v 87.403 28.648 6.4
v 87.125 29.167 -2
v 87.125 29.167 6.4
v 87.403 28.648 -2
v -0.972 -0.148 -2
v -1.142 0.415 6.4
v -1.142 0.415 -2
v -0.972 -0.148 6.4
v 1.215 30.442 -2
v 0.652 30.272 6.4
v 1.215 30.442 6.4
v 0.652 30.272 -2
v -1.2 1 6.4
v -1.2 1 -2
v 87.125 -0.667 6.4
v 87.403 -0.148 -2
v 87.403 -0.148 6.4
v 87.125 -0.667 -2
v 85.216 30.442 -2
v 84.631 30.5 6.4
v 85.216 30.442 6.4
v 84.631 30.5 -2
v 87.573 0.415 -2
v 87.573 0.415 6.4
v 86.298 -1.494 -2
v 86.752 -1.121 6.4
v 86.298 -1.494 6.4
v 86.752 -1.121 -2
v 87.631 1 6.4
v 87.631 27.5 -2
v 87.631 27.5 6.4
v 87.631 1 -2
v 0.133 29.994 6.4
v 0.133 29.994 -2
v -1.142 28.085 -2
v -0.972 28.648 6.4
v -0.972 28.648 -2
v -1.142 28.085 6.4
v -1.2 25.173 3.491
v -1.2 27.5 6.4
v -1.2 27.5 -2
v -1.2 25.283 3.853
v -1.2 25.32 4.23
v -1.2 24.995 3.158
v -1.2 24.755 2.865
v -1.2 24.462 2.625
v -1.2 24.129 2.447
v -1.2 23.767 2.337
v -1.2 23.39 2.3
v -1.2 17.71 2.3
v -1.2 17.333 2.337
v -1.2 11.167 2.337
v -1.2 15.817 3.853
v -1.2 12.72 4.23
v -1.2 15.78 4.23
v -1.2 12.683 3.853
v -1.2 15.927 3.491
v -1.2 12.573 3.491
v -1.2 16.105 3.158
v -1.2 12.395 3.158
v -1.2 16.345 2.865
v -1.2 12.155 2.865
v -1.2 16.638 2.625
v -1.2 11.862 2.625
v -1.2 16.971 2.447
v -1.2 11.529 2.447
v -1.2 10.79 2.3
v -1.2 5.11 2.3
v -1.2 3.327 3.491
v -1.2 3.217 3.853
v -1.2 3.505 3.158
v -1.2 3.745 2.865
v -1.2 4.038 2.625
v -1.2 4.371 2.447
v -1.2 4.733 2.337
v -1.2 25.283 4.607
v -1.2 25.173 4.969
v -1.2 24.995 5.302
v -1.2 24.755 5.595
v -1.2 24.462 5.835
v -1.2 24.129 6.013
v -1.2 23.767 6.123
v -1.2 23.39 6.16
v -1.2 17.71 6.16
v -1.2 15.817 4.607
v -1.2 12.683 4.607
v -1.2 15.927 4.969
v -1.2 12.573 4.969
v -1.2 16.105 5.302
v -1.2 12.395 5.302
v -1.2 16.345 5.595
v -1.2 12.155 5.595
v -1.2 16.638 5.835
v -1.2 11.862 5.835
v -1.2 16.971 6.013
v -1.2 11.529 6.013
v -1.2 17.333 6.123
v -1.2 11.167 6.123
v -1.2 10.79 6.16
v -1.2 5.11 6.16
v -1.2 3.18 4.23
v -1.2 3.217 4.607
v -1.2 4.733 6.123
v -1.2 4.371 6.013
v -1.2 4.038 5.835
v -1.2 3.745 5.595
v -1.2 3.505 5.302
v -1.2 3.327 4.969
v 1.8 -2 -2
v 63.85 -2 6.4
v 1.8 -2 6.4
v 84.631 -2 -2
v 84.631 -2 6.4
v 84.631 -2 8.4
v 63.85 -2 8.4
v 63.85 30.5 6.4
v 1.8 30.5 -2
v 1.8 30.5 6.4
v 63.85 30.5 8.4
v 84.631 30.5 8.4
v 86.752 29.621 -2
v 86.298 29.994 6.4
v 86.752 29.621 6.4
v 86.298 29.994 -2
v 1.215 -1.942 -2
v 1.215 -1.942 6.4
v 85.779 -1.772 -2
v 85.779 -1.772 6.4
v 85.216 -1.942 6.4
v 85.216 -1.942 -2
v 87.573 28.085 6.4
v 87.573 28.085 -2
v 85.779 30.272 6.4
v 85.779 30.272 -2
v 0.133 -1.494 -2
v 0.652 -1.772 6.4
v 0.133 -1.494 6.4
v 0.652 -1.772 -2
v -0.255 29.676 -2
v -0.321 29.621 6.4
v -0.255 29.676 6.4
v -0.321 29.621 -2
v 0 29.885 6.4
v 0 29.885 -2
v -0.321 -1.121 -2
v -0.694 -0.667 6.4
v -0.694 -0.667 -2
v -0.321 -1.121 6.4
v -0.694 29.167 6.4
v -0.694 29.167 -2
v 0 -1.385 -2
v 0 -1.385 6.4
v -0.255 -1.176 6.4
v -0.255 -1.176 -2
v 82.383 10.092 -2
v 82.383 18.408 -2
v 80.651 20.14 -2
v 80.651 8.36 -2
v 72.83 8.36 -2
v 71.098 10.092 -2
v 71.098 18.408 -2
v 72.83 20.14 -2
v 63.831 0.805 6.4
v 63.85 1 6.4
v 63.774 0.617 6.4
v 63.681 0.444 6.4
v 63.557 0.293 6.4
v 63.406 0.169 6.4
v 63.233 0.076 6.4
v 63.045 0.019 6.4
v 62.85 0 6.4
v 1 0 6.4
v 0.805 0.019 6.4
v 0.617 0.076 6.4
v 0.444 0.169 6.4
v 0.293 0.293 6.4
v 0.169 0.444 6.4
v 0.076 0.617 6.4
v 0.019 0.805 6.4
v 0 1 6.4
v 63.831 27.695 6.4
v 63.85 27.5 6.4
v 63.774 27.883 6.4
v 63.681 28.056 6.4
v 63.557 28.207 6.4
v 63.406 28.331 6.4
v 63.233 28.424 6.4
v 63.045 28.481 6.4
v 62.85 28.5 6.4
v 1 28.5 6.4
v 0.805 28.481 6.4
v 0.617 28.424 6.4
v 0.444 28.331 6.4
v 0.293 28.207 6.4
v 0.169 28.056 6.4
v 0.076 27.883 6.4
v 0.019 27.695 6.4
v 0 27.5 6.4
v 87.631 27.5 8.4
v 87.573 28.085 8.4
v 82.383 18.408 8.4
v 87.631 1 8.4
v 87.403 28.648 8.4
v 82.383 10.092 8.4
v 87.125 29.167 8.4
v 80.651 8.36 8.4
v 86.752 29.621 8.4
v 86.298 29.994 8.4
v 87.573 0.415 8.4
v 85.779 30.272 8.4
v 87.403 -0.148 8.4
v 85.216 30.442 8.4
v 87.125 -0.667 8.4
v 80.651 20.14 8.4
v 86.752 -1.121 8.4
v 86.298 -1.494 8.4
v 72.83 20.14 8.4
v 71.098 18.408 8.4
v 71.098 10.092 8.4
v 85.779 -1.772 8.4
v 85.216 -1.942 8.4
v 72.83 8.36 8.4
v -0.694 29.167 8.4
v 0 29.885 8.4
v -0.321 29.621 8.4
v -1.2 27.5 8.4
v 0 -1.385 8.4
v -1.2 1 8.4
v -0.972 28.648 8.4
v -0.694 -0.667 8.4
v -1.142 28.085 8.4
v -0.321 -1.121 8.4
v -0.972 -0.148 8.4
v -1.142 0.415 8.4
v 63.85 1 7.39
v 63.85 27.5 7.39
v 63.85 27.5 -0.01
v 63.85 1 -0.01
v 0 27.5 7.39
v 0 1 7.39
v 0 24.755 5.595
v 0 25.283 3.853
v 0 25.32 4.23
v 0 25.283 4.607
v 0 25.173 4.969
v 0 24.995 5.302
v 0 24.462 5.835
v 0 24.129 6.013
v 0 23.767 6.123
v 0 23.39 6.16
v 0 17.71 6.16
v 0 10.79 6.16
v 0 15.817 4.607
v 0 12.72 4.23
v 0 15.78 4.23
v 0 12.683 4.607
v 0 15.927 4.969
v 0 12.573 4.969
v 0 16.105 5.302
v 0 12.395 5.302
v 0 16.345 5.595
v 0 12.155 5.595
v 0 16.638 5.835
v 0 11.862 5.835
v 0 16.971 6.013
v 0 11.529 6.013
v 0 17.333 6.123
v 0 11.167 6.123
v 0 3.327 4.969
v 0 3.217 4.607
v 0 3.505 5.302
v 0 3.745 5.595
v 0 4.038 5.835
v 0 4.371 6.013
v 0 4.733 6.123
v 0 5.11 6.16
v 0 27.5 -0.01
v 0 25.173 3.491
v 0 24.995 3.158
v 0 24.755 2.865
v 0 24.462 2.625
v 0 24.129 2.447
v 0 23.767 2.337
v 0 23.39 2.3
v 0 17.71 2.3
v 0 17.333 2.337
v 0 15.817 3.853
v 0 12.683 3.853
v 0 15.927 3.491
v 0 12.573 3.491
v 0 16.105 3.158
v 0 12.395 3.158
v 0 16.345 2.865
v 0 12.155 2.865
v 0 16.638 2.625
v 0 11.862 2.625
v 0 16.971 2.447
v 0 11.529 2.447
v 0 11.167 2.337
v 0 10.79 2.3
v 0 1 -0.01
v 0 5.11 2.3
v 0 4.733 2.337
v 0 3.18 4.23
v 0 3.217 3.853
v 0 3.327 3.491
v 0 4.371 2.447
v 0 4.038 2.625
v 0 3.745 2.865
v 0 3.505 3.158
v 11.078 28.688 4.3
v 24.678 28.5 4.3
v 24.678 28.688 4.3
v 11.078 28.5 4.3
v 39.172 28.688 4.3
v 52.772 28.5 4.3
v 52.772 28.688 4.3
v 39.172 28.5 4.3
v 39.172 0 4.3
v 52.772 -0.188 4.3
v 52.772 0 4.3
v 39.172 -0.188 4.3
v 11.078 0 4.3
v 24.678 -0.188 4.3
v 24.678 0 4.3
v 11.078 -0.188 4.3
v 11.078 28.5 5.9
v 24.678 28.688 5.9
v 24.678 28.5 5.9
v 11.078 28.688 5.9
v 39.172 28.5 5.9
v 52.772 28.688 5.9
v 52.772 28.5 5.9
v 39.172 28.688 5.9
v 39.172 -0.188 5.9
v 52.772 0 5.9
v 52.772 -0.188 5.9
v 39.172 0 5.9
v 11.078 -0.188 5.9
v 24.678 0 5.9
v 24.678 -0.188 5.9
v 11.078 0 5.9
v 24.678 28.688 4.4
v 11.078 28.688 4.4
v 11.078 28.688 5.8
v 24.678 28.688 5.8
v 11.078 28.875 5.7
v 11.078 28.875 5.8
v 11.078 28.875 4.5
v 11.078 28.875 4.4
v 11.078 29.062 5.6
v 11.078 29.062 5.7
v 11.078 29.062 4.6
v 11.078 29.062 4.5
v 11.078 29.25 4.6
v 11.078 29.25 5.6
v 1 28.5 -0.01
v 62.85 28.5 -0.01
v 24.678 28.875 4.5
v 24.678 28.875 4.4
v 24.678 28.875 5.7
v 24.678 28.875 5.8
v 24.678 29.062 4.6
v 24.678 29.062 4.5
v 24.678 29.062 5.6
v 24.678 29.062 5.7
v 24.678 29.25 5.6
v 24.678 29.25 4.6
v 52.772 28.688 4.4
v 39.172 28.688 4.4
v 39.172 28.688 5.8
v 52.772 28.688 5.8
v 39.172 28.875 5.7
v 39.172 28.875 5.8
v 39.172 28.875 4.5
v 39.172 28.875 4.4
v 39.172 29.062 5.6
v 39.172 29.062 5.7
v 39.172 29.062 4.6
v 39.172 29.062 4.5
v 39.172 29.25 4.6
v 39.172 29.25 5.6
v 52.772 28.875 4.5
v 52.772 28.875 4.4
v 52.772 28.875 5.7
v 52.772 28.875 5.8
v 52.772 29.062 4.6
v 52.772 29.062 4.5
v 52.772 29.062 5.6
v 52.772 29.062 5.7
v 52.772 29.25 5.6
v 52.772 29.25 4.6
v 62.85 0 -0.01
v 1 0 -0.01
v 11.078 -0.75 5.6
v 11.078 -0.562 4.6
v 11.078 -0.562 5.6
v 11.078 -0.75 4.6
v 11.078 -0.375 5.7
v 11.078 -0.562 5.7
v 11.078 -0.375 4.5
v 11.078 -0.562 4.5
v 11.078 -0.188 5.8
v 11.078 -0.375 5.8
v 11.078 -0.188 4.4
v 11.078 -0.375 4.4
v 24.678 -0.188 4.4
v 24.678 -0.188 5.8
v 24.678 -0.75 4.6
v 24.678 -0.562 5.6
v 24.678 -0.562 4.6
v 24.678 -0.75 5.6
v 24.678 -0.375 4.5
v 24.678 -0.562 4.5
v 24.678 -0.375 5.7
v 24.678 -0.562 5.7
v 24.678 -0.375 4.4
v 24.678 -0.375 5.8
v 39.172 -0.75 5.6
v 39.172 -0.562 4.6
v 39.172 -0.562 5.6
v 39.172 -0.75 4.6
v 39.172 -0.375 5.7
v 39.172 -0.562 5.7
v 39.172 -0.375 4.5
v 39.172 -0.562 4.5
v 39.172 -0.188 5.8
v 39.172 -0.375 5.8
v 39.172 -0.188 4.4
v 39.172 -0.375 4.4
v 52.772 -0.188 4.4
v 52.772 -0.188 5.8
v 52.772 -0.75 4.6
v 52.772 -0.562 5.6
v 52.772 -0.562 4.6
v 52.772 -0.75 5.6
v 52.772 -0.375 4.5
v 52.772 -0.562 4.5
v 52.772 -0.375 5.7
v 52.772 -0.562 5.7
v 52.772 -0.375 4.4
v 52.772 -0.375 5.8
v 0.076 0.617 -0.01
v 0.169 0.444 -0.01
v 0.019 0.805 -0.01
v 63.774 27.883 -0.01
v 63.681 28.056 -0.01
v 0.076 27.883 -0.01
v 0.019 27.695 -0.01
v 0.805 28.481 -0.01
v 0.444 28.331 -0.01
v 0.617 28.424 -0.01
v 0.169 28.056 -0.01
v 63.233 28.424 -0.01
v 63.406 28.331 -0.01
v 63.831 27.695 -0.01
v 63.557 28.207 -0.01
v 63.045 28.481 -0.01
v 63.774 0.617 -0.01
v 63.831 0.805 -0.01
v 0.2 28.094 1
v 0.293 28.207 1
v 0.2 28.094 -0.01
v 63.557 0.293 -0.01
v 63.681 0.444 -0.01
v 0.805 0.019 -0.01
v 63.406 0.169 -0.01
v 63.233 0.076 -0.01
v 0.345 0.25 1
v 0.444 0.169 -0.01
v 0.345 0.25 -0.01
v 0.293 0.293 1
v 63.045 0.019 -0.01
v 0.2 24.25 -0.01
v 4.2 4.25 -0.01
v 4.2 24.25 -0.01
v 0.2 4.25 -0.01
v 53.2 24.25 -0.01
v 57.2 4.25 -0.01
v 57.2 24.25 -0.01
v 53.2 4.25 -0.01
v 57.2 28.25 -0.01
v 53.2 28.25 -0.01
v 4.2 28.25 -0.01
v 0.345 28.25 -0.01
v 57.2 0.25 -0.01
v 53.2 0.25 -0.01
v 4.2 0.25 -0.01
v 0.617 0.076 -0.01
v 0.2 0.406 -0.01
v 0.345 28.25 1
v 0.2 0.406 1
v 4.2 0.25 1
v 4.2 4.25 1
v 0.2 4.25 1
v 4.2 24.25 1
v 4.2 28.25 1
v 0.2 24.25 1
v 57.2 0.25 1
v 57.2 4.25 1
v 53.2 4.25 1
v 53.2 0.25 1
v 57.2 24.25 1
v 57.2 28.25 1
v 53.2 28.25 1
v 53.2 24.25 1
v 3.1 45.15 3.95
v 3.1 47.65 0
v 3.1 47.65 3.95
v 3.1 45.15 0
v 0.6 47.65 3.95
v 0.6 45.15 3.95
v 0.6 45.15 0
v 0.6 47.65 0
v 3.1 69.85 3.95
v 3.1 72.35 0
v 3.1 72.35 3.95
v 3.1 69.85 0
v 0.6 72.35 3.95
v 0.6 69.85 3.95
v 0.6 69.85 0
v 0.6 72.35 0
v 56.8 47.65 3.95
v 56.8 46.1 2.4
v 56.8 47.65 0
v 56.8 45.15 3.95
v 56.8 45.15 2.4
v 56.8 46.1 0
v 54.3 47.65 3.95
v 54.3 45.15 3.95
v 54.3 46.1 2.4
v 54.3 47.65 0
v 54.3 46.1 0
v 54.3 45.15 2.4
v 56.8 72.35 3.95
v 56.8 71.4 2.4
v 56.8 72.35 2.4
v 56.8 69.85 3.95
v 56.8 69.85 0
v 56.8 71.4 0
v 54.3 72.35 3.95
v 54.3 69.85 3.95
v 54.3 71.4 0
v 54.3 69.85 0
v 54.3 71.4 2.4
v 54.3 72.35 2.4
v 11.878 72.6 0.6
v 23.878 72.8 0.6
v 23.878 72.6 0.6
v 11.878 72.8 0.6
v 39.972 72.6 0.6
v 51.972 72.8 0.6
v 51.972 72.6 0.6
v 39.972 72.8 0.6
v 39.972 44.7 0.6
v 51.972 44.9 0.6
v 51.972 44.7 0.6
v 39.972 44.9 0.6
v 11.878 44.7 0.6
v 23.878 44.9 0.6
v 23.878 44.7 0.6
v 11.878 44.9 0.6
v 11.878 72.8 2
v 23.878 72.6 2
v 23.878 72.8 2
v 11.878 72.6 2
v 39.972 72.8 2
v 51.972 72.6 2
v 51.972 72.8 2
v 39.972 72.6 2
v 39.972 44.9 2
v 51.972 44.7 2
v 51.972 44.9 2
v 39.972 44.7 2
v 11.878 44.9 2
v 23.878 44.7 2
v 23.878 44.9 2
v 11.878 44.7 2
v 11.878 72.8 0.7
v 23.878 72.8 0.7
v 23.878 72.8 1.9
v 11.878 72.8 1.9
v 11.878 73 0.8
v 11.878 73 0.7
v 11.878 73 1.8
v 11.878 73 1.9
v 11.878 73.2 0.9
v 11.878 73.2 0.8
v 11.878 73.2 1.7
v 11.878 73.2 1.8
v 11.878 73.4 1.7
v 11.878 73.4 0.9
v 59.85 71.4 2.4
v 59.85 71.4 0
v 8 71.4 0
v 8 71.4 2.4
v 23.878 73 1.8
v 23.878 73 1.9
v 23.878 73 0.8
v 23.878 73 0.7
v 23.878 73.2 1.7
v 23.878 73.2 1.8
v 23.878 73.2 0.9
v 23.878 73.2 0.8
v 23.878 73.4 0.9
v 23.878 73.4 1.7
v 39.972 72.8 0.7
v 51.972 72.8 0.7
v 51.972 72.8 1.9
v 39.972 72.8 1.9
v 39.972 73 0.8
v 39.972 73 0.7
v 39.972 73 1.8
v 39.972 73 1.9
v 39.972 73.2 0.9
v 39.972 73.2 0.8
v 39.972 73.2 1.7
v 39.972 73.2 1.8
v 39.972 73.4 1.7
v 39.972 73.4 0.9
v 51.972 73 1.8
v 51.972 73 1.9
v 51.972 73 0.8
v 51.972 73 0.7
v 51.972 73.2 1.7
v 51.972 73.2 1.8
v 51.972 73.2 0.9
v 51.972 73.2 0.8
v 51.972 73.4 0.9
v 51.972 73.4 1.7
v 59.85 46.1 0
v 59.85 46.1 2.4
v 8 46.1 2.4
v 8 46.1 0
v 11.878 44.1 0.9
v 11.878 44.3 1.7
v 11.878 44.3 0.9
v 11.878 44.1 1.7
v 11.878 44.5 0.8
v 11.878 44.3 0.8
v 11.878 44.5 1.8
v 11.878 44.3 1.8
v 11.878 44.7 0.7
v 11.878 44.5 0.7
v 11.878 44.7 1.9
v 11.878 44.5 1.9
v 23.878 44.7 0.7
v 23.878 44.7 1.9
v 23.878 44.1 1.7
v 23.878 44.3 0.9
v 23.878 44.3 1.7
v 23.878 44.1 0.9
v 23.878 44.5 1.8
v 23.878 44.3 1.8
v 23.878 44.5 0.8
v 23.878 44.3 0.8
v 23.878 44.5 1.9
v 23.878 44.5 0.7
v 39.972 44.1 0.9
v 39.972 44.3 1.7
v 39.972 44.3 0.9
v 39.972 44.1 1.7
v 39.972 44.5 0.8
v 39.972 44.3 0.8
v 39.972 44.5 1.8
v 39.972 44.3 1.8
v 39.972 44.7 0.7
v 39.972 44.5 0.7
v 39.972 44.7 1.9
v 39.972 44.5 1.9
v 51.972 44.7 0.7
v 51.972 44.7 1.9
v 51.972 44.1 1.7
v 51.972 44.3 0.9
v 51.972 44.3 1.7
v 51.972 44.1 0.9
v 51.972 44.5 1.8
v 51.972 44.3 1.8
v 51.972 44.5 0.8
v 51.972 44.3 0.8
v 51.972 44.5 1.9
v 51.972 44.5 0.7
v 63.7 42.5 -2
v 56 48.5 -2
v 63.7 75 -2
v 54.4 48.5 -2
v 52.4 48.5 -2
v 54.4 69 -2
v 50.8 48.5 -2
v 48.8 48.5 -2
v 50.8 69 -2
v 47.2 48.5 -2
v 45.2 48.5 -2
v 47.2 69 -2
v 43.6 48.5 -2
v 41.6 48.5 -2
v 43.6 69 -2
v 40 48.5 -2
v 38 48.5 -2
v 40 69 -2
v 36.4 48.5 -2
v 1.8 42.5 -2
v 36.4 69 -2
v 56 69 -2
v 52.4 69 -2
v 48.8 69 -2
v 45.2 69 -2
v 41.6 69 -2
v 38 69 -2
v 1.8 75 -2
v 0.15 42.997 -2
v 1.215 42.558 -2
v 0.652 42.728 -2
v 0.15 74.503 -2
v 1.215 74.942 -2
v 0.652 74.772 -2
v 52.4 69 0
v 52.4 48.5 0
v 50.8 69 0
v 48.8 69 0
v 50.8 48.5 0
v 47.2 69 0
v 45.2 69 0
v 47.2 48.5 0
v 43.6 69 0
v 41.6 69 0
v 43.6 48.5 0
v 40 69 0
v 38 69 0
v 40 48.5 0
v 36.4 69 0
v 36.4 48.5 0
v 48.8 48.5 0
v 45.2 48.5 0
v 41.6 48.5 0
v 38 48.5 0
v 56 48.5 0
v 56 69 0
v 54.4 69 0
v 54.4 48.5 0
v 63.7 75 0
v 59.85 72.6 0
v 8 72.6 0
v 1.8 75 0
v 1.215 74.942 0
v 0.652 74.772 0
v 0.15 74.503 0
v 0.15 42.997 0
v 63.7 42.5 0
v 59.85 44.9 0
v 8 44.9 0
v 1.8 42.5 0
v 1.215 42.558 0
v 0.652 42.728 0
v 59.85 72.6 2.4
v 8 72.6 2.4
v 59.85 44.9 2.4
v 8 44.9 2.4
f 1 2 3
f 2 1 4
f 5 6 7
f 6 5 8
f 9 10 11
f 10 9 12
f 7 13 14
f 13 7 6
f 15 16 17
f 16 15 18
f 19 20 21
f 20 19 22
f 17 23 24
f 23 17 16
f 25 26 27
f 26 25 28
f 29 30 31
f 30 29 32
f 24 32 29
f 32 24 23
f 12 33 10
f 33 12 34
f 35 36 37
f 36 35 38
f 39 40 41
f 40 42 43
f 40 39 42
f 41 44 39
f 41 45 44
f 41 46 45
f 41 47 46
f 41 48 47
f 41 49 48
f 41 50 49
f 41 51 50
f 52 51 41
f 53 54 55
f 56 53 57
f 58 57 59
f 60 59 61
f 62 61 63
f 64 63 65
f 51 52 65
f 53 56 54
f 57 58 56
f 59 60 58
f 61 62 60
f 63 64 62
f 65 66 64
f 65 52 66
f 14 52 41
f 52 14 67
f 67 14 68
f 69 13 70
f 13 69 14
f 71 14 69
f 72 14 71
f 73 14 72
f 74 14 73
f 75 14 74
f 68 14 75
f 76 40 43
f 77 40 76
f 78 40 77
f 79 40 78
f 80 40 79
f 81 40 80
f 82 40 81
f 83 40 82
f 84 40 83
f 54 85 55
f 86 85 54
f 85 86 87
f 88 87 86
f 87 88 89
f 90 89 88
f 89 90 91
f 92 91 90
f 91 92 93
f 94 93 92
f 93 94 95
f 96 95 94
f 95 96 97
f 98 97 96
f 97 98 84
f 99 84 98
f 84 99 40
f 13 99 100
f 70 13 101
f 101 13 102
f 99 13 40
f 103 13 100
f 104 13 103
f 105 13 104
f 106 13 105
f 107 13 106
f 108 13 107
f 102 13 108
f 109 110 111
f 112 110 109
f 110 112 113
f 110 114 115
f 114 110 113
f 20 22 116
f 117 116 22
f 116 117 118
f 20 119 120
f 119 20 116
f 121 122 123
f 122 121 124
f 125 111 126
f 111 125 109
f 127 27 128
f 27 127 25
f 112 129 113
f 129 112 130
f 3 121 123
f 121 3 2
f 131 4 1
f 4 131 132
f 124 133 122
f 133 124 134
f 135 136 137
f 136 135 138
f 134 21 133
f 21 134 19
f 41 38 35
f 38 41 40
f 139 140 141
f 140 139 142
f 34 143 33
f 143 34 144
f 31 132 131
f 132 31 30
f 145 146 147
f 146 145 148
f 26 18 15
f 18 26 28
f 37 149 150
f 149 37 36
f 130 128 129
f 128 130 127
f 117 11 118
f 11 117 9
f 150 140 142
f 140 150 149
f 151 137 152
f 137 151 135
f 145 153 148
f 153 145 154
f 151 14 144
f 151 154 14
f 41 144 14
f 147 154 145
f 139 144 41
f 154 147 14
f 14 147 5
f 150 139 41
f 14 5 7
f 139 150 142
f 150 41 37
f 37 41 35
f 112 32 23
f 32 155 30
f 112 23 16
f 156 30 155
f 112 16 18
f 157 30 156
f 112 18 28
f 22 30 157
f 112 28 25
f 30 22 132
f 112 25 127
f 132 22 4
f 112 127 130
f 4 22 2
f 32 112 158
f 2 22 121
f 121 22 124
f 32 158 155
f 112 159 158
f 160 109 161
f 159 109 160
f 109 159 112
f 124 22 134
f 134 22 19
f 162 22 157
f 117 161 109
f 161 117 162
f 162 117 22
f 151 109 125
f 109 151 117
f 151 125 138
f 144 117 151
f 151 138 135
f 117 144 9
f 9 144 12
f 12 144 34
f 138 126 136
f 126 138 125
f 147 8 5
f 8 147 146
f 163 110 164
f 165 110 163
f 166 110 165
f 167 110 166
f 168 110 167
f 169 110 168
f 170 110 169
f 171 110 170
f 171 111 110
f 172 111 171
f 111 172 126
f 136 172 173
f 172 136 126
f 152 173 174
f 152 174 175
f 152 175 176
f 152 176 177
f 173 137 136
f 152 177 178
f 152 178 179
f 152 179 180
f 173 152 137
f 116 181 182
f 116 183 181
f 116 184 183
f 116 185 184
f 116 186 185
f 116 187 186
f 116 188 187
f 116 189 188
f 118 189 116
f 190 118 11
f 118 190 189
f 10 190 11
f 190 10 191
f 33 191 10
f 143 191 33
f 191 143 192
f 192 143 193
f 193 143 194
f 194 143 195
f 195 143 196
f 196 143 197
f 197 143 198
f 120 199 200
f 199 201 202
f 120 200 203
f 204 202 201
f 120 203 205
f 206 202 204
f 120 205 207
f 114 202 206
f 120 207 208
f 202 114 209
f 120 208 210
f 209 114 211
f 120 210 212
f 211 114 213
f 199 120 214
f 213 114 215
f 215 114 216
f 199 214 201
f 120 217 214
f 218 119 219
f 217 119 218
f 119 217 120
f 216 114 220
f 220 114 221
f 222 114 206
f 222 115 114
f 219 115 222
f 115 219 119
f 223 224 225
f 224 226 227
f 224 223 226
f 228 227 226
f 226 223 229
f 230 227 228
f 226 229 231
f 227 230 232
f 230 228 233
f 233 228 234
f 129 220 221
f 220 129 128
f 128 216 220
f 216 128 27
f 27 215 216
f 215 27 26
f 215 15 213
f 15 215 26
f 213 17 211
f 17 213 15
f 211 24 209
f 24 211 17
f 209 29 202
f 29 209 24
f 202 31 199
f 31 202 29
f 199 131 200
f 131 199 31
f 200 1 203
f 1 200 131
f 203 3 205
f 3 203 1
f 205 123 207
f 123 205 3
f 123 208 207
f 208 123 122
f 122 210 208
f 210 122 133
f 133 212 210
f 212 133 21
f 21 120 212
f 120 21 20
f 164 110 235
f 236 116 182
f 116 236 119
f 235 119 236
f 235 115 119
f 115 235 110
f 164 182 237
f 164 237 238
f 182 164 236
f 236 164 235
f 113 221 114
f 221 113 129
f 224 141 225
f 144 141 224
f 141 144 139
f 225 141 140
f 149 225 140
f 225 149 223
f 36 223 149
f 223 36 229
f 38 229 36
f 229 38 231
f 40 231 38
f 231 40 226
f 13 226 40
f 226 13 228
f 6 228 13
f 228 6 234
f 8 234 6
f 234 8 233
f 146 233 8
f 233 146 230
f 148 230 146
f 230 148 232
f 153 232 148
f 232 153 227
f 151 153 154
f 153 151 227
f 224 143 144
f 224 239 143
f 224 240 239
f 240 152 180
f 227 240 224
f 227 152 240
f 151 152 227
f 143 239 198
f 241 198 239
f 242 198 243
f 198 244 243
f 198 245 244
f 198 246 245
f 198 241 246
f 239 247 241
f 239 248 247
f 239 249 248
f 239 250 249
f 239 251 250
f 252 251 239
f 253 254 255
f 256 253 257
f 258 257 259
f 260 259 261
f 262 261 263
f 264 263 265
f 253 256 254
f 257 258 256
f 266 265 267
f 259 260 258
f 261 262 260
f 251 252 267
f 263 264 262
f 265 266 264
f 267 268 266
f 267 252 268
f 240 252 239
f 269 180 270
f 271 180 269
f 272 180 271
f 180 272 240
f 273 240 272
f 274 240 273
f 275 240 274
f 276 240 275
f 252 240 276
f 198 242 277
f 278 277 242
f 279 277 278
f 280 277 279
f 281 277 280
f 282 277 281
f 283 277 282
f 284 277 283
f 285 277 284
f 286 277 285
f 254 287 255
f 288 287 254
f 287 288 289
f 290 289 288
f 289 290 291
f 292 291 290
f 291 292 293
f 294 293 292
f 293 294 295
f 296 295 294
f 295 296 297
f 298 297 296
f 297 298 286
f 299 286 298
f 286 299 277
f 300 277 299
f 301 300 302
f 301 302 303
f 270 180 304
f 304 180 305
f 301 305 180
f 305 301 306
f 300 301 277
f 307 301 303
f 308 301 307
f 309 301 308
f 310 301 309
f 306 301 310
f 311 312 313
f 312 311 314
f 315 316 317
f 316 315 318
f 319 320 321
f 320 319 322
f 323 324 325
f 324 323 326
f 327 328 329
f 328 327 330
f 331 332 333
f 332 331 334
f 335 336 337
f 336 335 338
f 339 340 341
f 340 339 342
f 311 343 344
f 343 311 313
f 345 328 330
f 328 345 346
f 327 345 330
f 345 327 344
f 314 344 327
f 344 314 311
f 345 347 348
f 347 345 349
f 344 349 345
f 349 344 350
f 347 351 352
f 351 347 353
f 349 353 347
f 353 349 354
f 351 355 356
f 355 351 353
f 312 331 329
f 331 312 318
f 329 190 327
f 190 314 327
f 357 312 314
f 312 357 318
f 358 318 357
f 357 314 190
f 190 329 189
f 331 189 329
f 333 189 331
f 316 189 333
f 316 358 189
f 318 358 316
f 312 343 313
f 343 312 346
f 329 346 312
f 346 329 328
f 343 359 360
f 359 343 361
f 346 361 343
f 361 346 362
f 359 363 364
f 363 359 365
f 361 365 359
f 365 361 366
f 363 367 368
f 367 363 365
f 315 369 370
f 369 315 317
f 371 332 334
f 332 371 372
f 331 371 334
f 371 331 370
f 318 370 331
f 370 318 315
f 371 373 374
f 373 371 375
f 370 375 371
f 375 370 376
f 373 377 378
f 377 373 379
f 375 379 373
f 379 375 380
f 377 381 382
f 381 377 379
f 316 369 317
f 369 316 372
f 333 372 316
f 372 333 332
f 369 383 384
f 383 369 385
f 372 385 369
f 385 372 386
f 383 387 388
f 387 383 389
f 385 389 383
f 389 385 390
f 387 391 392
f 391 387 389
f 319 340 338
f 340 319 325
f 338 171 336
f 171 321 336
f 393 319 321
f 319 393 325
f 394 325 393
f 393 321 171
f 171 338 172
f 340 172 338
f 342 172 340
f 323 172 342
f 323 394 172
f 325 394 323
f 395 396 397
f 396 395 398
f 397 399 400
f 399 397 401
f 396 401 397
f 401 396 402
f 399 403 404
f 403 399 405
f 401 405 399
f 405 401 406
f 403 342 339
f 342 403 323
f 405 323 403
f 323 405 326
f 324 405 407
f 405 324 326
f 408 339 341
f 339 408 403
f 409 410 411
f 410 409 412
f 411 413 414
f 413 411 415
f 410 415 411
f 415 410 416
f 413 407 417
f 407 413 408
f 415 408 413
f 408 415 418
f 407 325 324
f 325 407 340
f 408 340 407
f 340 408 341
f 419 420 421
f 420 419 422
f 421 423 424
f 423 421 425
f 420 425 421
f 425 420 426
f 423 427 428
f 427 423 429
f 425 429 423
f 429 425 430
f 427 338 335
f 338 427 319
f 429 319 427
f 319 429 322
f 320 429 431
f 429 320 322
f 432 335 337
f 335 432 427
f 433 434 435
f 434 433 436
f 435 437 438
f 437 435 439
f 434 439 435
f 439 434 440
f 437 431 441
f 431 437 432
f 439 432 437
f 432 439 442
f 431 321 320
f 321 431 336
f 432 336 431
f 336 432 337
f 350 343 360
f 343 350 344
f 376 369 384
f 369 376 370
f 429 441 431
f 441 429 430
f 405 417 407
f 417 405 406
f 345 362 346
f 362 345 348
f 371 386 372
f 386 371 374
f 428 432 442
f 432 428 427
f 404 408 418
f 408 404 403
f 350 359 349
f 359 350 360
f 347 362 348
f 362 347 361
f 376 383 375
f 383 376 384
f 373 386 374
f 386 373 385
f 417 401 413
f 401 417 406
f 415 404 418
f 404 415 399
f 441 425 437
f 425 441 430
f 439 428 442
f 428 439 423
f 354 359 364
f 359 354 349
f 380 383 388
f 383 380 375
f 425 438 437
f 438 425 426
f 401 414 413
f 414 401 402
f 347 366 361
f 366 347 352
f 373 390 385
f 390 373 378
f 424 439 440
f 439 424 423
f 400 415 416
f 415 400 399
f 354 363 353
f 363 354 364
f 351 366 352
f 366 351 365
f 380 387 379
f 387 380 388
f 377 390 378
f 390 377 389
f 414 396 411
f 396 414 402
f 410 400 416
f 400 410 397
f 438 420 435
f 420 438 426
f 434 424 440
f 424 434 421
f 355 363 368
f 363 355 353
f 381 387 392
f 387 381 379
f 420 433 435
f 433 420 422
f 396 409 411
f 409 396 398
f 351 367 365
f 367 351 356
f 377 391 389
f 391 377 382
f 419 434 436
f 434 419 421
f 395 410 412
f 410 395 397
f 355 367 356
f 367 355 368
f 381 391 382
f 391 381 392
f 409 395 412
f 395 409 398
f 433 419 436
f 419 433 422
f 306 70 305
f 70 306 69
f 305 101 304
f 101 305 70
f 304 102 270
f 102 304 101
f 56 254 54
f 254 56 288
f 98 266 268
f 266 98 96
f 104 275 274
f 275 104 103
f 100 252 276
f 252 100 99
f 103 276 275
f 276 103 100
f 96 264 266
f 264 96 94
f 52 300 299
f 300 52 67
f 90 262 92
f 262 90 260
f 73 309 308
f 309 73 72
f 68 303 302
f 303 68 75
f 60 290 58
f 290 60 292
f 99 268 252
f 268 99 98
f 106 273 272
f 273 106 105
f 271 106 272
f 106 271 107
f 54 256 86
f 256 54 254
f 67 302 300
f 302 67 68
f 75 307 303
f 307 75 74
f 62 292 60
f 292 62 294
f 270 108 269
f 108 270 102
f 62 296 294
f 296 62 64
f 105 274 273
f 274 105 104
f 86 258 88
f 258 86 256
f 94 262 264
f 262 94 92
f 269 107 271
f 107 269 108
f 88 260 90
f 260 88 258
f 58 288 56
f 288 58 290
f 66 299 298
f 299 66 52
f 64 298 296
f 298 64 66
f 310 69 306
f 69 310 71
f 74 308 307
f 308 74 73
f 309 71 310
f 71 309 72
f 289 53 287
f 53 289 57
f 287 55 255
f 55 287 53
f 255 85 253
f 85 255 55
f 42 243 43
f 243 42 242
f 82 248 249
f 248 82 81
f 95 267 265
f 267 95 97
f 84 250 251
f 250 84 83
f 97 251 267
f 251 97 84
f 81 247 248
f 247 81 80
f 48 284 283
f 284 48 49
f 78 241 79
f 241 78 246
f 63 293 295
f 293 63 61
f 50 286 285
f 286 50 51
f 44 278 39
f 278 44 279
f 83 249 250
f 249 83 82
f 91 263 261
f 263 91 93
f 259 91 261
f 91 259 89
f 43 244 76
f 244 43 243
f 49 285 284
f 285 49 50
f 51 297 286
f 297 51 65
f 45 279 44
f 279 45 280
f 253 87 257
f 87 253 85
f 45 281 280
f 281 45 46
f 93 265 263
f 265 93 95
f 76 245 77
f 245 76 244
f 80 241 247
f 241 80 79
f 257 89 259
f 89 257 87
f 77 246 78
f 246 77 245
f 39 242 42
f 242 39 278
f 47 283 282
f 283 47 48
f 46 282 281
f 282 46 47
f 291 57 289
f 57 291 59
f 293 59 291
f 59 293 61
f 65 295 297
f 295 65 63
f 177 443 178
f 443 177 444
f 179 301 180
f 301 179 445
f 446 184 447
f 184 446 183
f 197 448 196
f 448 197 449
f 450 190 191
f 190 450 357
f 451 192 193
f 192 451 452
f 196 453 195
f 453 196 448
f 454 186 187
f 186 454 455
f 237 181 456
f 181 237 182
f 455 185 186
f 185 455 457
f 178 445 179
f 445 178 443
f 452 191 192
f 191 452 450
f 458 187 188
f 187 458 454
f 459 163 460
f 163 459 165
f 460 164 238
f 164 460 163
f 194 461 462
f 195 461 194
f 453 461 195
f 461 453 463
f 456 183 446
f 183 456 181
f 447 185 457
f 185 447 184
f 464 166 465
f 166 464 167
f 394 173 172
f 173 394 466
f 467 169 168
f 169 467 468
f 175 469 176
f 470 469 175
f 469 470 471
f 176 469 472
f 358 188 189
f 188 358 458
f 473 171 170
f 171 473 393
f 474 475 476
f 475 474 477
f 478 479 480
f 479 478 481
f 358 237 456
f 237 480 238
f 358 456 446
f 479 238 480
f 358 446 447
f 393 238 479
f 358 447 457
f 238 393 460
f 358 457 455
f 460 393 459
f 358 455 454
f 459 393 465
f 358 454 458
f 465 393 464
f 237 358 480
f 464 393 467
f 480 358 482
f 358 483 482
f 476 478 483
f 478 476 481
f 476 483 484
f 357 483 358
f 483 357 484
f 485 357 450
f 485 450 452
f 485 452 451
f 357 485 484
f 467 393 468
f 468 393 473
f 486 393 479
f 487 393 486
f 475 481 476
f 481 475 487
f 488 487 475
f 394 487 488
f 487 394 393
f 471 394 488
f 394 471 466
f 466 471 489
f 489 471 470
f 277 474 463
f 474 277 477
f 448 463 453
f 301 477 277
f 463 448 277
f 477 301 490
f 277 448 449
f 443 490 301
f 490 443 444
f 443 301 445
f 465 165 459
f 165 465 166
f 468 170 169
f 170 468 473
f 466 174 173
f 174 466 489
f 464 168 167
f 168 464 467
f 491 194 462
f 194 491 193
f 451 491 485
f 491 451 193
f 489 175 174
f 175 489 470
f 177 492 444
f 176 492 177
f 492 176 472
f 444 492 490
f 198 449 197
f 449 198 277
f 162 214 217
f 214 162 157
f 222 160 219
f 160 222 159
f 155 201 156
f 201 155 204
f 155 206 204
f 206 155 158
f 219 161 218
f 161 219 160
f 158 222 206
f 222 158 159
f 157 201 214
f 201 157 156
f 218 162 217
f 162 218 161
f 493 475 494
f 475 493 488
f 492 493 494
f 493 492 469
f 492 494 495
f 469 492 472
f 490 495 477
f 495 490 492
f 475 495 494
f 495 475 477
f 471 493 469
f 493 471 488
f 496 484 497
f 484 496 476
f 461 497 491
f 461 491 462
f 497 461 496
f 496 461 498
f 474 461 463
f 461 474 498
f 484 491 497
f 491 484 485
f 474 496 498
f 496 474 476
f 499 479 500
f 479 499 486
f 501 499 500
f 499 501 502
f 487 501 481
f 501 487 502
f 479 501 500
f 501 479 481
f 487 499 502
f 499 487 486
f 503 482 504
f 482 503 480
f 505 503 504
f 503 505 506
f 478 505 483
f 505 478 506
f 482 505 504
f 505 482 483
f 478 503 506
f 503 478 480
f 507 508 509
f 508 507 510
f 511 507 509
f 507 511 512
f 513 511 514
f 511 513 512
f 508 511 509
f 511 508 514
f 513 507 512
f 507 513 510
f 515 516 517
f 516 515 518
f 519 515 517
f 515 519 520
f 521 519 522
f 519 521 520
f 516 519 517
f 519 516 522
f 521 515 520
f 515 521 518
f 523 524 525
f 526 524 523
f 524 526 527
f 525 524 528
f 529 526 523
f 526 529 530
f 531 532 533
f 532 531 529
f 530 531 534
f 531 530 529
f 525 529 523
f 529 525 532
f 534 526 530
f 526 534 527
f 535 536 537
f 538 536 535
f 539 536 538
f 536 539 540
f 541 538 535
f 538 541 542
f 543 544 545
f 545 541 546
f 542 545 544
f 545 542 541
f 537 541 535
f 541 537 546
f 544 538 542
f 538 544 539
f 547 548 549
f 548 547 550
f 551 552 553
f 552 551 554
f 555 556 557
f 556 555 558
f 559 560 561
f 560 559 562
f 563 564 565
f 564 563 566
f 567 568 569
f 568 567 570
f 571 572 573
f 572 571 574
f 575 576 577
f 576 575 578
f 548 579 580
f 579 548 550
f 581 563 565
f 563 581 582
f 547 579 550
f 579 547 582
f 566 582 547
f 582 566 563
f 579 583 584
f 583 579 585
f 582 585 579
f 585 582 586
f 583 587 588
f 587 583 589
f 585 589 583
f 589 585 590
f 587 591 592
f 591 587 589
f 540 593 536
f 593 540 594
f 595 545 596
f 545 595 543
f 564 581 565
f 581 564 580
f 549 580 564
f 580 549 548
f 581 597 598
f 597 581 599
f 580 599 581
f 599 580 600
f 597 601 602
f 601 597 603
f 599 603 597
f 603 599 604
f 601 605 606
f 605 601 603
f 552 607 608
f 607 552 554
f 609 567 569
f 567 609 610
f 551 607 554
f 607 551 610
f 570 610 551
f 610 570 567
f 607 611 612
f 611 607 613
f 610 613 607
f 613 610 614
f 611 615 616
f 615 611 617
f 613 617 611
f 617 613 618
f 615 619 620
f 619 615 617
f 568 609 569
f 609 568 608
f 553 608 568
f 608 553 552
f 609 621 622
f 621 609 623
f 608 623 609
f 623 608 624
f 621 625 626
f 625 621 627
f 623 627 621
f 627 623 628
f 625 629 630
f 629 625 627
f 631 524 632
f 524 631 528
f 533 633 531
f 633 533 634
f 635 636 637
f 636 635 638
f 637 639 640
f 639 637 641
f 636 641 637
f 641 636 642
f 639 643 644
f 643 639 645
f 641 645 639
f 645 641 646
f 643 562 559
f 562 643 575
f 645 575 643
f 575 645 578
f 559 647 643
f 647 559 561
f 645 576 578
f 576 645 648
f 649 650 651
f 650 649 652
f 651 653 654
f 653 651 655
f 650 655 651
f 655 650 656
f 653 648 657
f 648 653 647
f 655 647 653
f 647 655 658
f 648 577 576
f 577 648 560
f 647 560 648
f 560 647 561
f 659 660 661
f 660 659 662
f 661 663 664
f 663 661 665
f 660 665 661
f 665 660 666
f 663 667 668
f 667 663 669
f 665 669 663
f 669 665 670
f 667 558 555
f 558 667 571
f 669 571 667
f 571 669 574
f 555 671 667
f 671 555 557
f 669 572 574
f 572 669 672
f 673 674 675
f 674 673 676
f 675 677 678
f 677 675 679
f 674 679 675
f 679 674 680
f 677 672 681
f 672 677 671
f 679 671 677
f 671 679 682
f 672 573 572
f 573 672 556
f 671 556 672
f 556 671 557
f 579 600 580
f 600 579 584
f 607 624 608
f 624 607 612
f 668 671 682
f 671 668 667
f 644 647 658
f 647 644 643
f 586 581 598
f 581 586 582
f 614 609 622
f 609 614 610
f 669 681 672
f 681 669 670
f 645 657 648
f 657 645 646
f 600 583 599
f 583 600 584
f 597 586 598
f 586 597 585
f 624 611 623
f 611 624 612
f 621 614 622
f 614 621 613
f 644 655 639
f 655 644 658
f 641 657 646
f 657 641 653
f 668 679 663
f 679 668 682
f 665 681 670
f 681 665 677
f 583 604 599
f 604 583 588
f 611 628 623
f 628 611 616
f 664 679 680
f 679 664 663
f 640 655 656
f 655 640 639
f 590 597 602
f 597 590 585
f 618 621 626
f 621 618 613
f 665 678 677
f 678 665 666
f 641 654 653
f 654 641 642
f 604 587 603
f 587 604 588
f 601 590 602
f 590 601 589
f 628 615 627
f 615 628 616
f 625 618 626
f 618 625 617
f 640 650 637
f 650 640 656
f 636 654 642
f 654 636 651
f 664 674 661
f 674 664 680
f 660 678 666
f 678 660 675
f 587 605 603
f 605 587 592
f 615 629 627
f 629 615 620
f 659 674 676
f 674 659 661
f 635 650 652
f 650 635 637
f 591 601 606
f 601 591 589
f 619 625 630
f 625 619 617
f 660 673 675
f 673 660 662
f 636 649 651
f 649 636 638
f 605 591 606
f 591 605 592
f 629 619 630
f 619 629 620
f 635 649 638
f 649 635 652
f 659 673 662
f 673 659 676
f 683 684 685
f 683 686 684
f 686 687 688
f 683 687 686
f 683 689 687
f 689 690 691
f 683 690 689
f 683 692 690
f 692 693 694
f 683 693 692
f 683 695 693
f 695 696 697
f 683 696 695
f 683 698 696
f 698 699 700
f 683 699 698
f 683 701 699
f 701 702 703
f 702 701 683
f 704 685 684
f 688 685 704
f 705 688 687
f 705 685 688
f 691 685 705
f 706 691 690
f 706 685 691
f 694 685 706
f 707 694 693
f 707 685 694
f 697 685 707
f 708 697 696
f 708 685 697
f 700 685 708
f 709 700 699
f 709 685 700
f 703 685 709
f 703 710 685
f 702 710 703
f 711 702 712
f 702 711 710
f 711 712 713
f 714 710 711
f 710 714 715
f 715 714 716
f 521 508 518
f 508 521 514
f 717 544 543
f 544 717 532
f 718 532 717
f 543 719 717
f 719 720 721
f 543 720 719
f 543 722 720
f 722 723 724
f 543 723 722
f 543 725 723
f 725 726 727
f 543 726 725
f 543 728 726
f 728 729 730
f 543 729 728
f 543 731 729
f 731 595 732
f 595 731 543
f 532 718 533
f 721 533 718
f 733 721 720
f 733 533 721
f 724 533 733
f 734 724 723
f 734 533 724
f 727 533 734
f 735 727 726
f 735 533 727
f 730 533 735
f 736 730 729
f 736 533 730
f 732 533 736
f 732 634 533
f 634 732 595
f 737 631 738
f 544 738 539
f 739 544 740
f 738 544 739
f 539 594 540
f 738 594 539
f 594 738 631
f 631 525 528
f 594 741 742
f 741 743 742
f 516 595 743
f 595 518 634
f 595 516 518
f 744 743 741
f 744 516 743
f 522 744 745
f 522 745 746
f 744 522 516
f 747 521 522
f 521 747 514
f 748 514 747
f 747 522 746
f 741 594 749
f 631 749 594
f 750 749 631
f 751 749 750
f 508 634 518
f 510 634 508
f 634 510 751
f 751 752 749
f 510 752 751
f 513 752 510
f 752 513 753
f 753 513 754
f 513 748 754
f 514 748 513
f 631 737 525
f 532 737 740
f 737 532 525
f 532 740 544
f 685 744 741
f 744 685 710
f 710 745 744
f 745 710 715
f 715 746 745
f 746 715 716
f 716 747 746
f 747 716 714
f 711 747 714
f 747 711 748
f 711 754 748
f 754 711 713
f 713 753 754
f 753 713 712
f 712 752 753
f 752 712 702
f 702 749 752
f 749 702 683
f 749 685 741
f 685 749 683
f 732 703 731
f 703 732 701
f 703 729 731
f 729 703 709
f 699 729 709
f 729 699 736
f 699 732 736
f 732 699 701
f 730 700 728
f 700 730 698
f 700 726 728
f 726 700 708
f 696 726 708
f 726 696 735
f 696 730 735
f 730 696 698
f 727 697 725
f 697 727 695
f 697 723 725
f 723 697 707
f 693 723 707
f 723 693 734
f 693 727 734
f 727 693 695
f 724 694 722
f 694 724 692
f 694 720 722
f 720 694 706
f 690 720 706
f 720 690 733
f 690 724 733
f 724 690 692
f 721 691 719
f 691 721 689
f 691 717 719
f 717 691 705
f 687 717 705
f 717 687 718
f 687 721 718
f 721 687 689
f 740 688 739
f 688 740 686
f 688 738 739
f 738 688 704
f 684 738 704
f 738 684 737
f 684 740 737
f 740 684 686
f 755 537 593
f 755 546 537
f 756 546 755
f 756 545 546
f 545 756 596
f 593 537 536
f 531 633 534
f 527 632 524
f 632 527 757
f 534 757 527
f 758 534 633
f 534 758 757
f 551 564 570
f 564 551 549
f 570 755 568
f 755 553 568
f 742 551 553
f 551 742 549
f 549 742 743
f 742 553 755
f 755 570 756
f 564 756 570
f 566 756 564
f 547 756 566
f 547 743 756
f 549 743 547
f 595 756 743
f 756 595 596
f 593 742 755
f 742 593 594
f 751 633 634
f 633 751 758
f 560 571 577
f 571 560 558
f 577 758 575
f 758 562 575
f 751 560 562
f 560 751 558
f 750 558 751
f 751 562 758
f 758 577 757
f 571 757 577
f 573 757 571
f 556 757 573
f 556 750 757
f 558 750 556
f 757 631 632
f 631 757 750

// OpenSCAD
// SPDX-License-Identifier: GPL-3.0-or-later
// Copyright (C) 2026 UnluckyQuote

// ESP32-S3-DevKitC-1 slim snap-close case with USB-B plug tab
// Frame: x along the board length (USB-C end at x<0), y across, z up from the floor top.
// Print: box floor-down, lid plate-down (skirt up). Supports are needed for the USB-C holes.
part = "print";
$fn = 32; eps = 0.01;

board_l = 57;  board_w = 28;
pcb_t = 1.6;
board_total_h = 5.0;
top_h = board_total_h - pcb_t;
under_clear = 1.0;
support = "pads";
pad_size = 4;
board_clear = 0.25;
lid_gap = 0.4;
vent_n = 6; vent_pitch = 3.6; vent_w = 1.6;

usbc_w = 8.94 + 0.6;  usbc_h = 3.26 + 0.6;
usbc_pitch = 12.6;
usbc_cz = 1.63;
usb_over = 0.5;
pcb_end_gap = 0.2;
usb_wall = 1.2;

plug_flat_w = 7.5;
plug_flat_h = 8.0;
plug_chamfer = 1.75;
plug_scale = 0.99;
plug_w = plug_flat_w + 2*plug_chamfer;
plug_h = plug_flat_h + 2*plug_chamfer;
plug_rot = 0;
plug_clear = 0.2;
tab_margin = 5;

wall = 2; floor_t = 2; lid_t = 2.0; r_out = 3;
skirt_t = 1.2; skirt_h = 2.4; skirt_clear = 0.4; bump = 0.8; groove_d = 0.75;
band_half = 0.8; n = 4;
band_depth = 1.3;
band_z = skirt_h - band_depth;
peg_size = 2.5;
peg_press = 0.15;
snap_len = 12;
snap_pos = [0.28, 0.72];

vent_cx = pcb_end_gap + board_l - 11;
ant_len = 6.0;
ant_w = board_w - 0.5;
ant_clear = 0.4;
in_x = pcb_end_gap + board_l + board_clear + ant_len + ant_clear;
in_y = board_w + 2*board_clear;
in_h = under_clear + pcb_t + top_h + lid_gap;
plug_hole_w = (plug_w + 2*plug_clear) * plug_scale;
plug_hole_h = (plug_h + 2*plug_clear) * plug_scale;
ext_len = plug_hole_h + 2*tab_margin;

module rrect(x, y, r) { hull() for (i=[r, x-r], j=[r, y-r]) translate([i,j]) circle(r); }
module cavity2() rrect(in_x, in_y, 1);
module outer2() translate([-usb_wall, -wall]) rrect(in_x + usb_wall + wall + ext_len, in_y + 2*wall, r_out);

module snap_mask(extra = 0) {
  for (f=snap_pos) translate([f*in_x - (snap_len + 2*extra)/2, -wall - 1]) square([snap_len + 2*extra, in_y + 2*wall + 2]);
}

lid_fit = 0.15;
skirt_x0 = 8;
skirt_x1 = 4;
module skirt_span() translate([skirt_x0, -wall - 1]) square([in_x - skirt_x0 - skirt_x1, in_y + 2*wall + 2]);
module lid_outline2() {
  intersection() {
    outer2();
    translate([lid_fit, -wall - 1]) square([in_x - 2*lid_fit, in_y + 2*wall + 2]);
  }
}

module groove() {
  zc = in_h - band_depth;
  for (i=[0:n-1]) {
    d  = groove_d * (i+1)/n;
    hh = (band_half + 0.1) - d*(band_half-0.4)/groove_d;
    translate([0,0,zc - hh]) linear_extrude(2*hh) intersection() {
      difference() { offset(delta=d) cavity2(); cavity2(); }
      snap_mask(0.8);
    }
  }
}

module usbc_hole() {
  zc = under_clear + pcb_t + usbc_cz;
  for (s=[-1,1]) translate([-usb_wall-1, in_y/2 + s*usbc_pitch/2, zc])
    rotate([90,0,90]) linear_extrude(usb_wall + 1 + pcb_end_gap + 0.5)
      hull() for (k=[-1,1]) translate([k*(usbc_w/2 - usbc_h/2), 0]) circle(d=usbc_h);
}

module plug_hole2d(clear = plug_clear, c = plug_chamfer) {
  W = plug_flat_w + 2*c + 2*clear; H = plug_flat_h + 2*c + 2*clear;
  rotate(plug_rot) polygon([[-W/2+c,-H/2],[W/2-c,-H/2],[W/2,-H/2+c],[W/2,H/2-c],[W/2-c,H/2],[-W/2+c,H/2],[-W/2,H/2-c],[-W/2,-H/2+c]]);
}

module box() {
  difference() {
    union() {
      translate([0,0,-floor_t]) linear_extrude(in_h + floor_t) outer2();
      translate([0,0,-floor_t]) linear_extrude(in_h + floor_t + lid_t) intersection() {
        outer2();
        union() {
          translate([-usb_wall - 1, -wall - 1]) square([usb_wall + 1, in_y + 2*wall + 2]);
          translate([in_x, -wall - 1]) square([wall + ext_len + 1, in_y + 2*wall + 2]);
        }
      }
    }
    translate([0,0,-eps]) linear_extrude(in_h + 1) cavity2();
    groove();
    usbc_hole();
    translate([in_x + wall + ext_len/2, in_y/2, -floor_t - 1]) linear_extrude(floor_t + in_h + lid_t + 2) scale(plug_scale) plug_hole2d();
  }
  if (support == "pads")
    for (x0=[pcb_end_gap, pcb_end_gap + board_l - pad_size], y0=[board_clear, board_clear + board_w - pad_size])
      translate([x0, y0, -eps]) cube([pad_size, pad_size, under_clear + eps]);
  if (support == "rails")
    for (y0=[board_clear, board_clear + board_w - 2])
      translate([pcb_end_gap, y0, -eps]) cube([board_l, 2, under_clear + eps]);
}

module lid() {
  linear_extrude(lid_t) difference() {
    lid_outline2();
    for (i=[0:vent_n-1]) translate([vent_cx + (i - (vent_n-1)/2)*vent_pitch - vent_w/2, in_y/2 - (in_y-8)/2]) square([vent_w, in_y-8]);
  }
  for (x0=[pcb_end_gap + 0.4, pcb_end_gap + board_l - 0.4 - peg_size], y0=[board_clear + 0.4, board_clear + board_w - 0.4 - peg_size])
    translate([x0, y0, lid_t - eps]) cube([peg_size, peg_size, top_h + lid_gap + peg_press + eps]);
  top = lid_t + skirt_h;
  translate([0,0,lid_t-eps]) linear_extrude(skirt_h+eps) intersection() {
    difference() {
      offset(delta=-skirt_clear) cavity2();
      offset(delta=-skirt_clear-skirt_t) cavity2();
    }
    skirt_span();
  }
  zc = top - band_z;
  for (i=[0:n-1]) {
    p  = bump*(i+1)/n;
    hh = band_half - p*(band_half-0.4)/bump;
    translate([0,0,zc - hh]) linear_extrude(2*hh) intersection() {
      difference() { offset(delta=-skirt_clear+p) cavity2(); offset(delta=-skirt_clear-skirt_t) cavity2(); }
      snap_mask();
    }
  }
}

module ghost() {
  color("green", 0.35) translate([pcb_end_gap, board_clear, under_clear]) cube([board_l, board_w, pcb_t]);
  color("silver", 0.5) for (s=[-1,1])
    translate([pcb_end_gap - usb_over, in_y/2 + s*usbc_pitch/2 - 8.94/2, under_clear + pcb_t]) cube([7, 8.94, 3.26]);
  color("gold", 0.6) translate([pcb_end_gap + board_l, in_y/2 - ant_w/2, under_clear]) cube([ant_len, ant_w, 0.7]);
}

if (part == "box") box();
else if (part == "lid") lid();
else if (part == "print") { box(); translate([0, in_y + 2*wall + 12, -floor_t]) lid(); }
else if (part == "closed") { box(); translate([0, in_y, in_h + lid_t]) rotate([180,0,0]) lid(); }
else if (part == "closed_lid") translate([0, in_y, in_h + lid_t]) rotate([180,0,0]) lid();
else { box(); ghost(); color("orange", 0.8) translate([0, in_y, in_h + lid_t]) rotate([180,0,0]) lid(); }
